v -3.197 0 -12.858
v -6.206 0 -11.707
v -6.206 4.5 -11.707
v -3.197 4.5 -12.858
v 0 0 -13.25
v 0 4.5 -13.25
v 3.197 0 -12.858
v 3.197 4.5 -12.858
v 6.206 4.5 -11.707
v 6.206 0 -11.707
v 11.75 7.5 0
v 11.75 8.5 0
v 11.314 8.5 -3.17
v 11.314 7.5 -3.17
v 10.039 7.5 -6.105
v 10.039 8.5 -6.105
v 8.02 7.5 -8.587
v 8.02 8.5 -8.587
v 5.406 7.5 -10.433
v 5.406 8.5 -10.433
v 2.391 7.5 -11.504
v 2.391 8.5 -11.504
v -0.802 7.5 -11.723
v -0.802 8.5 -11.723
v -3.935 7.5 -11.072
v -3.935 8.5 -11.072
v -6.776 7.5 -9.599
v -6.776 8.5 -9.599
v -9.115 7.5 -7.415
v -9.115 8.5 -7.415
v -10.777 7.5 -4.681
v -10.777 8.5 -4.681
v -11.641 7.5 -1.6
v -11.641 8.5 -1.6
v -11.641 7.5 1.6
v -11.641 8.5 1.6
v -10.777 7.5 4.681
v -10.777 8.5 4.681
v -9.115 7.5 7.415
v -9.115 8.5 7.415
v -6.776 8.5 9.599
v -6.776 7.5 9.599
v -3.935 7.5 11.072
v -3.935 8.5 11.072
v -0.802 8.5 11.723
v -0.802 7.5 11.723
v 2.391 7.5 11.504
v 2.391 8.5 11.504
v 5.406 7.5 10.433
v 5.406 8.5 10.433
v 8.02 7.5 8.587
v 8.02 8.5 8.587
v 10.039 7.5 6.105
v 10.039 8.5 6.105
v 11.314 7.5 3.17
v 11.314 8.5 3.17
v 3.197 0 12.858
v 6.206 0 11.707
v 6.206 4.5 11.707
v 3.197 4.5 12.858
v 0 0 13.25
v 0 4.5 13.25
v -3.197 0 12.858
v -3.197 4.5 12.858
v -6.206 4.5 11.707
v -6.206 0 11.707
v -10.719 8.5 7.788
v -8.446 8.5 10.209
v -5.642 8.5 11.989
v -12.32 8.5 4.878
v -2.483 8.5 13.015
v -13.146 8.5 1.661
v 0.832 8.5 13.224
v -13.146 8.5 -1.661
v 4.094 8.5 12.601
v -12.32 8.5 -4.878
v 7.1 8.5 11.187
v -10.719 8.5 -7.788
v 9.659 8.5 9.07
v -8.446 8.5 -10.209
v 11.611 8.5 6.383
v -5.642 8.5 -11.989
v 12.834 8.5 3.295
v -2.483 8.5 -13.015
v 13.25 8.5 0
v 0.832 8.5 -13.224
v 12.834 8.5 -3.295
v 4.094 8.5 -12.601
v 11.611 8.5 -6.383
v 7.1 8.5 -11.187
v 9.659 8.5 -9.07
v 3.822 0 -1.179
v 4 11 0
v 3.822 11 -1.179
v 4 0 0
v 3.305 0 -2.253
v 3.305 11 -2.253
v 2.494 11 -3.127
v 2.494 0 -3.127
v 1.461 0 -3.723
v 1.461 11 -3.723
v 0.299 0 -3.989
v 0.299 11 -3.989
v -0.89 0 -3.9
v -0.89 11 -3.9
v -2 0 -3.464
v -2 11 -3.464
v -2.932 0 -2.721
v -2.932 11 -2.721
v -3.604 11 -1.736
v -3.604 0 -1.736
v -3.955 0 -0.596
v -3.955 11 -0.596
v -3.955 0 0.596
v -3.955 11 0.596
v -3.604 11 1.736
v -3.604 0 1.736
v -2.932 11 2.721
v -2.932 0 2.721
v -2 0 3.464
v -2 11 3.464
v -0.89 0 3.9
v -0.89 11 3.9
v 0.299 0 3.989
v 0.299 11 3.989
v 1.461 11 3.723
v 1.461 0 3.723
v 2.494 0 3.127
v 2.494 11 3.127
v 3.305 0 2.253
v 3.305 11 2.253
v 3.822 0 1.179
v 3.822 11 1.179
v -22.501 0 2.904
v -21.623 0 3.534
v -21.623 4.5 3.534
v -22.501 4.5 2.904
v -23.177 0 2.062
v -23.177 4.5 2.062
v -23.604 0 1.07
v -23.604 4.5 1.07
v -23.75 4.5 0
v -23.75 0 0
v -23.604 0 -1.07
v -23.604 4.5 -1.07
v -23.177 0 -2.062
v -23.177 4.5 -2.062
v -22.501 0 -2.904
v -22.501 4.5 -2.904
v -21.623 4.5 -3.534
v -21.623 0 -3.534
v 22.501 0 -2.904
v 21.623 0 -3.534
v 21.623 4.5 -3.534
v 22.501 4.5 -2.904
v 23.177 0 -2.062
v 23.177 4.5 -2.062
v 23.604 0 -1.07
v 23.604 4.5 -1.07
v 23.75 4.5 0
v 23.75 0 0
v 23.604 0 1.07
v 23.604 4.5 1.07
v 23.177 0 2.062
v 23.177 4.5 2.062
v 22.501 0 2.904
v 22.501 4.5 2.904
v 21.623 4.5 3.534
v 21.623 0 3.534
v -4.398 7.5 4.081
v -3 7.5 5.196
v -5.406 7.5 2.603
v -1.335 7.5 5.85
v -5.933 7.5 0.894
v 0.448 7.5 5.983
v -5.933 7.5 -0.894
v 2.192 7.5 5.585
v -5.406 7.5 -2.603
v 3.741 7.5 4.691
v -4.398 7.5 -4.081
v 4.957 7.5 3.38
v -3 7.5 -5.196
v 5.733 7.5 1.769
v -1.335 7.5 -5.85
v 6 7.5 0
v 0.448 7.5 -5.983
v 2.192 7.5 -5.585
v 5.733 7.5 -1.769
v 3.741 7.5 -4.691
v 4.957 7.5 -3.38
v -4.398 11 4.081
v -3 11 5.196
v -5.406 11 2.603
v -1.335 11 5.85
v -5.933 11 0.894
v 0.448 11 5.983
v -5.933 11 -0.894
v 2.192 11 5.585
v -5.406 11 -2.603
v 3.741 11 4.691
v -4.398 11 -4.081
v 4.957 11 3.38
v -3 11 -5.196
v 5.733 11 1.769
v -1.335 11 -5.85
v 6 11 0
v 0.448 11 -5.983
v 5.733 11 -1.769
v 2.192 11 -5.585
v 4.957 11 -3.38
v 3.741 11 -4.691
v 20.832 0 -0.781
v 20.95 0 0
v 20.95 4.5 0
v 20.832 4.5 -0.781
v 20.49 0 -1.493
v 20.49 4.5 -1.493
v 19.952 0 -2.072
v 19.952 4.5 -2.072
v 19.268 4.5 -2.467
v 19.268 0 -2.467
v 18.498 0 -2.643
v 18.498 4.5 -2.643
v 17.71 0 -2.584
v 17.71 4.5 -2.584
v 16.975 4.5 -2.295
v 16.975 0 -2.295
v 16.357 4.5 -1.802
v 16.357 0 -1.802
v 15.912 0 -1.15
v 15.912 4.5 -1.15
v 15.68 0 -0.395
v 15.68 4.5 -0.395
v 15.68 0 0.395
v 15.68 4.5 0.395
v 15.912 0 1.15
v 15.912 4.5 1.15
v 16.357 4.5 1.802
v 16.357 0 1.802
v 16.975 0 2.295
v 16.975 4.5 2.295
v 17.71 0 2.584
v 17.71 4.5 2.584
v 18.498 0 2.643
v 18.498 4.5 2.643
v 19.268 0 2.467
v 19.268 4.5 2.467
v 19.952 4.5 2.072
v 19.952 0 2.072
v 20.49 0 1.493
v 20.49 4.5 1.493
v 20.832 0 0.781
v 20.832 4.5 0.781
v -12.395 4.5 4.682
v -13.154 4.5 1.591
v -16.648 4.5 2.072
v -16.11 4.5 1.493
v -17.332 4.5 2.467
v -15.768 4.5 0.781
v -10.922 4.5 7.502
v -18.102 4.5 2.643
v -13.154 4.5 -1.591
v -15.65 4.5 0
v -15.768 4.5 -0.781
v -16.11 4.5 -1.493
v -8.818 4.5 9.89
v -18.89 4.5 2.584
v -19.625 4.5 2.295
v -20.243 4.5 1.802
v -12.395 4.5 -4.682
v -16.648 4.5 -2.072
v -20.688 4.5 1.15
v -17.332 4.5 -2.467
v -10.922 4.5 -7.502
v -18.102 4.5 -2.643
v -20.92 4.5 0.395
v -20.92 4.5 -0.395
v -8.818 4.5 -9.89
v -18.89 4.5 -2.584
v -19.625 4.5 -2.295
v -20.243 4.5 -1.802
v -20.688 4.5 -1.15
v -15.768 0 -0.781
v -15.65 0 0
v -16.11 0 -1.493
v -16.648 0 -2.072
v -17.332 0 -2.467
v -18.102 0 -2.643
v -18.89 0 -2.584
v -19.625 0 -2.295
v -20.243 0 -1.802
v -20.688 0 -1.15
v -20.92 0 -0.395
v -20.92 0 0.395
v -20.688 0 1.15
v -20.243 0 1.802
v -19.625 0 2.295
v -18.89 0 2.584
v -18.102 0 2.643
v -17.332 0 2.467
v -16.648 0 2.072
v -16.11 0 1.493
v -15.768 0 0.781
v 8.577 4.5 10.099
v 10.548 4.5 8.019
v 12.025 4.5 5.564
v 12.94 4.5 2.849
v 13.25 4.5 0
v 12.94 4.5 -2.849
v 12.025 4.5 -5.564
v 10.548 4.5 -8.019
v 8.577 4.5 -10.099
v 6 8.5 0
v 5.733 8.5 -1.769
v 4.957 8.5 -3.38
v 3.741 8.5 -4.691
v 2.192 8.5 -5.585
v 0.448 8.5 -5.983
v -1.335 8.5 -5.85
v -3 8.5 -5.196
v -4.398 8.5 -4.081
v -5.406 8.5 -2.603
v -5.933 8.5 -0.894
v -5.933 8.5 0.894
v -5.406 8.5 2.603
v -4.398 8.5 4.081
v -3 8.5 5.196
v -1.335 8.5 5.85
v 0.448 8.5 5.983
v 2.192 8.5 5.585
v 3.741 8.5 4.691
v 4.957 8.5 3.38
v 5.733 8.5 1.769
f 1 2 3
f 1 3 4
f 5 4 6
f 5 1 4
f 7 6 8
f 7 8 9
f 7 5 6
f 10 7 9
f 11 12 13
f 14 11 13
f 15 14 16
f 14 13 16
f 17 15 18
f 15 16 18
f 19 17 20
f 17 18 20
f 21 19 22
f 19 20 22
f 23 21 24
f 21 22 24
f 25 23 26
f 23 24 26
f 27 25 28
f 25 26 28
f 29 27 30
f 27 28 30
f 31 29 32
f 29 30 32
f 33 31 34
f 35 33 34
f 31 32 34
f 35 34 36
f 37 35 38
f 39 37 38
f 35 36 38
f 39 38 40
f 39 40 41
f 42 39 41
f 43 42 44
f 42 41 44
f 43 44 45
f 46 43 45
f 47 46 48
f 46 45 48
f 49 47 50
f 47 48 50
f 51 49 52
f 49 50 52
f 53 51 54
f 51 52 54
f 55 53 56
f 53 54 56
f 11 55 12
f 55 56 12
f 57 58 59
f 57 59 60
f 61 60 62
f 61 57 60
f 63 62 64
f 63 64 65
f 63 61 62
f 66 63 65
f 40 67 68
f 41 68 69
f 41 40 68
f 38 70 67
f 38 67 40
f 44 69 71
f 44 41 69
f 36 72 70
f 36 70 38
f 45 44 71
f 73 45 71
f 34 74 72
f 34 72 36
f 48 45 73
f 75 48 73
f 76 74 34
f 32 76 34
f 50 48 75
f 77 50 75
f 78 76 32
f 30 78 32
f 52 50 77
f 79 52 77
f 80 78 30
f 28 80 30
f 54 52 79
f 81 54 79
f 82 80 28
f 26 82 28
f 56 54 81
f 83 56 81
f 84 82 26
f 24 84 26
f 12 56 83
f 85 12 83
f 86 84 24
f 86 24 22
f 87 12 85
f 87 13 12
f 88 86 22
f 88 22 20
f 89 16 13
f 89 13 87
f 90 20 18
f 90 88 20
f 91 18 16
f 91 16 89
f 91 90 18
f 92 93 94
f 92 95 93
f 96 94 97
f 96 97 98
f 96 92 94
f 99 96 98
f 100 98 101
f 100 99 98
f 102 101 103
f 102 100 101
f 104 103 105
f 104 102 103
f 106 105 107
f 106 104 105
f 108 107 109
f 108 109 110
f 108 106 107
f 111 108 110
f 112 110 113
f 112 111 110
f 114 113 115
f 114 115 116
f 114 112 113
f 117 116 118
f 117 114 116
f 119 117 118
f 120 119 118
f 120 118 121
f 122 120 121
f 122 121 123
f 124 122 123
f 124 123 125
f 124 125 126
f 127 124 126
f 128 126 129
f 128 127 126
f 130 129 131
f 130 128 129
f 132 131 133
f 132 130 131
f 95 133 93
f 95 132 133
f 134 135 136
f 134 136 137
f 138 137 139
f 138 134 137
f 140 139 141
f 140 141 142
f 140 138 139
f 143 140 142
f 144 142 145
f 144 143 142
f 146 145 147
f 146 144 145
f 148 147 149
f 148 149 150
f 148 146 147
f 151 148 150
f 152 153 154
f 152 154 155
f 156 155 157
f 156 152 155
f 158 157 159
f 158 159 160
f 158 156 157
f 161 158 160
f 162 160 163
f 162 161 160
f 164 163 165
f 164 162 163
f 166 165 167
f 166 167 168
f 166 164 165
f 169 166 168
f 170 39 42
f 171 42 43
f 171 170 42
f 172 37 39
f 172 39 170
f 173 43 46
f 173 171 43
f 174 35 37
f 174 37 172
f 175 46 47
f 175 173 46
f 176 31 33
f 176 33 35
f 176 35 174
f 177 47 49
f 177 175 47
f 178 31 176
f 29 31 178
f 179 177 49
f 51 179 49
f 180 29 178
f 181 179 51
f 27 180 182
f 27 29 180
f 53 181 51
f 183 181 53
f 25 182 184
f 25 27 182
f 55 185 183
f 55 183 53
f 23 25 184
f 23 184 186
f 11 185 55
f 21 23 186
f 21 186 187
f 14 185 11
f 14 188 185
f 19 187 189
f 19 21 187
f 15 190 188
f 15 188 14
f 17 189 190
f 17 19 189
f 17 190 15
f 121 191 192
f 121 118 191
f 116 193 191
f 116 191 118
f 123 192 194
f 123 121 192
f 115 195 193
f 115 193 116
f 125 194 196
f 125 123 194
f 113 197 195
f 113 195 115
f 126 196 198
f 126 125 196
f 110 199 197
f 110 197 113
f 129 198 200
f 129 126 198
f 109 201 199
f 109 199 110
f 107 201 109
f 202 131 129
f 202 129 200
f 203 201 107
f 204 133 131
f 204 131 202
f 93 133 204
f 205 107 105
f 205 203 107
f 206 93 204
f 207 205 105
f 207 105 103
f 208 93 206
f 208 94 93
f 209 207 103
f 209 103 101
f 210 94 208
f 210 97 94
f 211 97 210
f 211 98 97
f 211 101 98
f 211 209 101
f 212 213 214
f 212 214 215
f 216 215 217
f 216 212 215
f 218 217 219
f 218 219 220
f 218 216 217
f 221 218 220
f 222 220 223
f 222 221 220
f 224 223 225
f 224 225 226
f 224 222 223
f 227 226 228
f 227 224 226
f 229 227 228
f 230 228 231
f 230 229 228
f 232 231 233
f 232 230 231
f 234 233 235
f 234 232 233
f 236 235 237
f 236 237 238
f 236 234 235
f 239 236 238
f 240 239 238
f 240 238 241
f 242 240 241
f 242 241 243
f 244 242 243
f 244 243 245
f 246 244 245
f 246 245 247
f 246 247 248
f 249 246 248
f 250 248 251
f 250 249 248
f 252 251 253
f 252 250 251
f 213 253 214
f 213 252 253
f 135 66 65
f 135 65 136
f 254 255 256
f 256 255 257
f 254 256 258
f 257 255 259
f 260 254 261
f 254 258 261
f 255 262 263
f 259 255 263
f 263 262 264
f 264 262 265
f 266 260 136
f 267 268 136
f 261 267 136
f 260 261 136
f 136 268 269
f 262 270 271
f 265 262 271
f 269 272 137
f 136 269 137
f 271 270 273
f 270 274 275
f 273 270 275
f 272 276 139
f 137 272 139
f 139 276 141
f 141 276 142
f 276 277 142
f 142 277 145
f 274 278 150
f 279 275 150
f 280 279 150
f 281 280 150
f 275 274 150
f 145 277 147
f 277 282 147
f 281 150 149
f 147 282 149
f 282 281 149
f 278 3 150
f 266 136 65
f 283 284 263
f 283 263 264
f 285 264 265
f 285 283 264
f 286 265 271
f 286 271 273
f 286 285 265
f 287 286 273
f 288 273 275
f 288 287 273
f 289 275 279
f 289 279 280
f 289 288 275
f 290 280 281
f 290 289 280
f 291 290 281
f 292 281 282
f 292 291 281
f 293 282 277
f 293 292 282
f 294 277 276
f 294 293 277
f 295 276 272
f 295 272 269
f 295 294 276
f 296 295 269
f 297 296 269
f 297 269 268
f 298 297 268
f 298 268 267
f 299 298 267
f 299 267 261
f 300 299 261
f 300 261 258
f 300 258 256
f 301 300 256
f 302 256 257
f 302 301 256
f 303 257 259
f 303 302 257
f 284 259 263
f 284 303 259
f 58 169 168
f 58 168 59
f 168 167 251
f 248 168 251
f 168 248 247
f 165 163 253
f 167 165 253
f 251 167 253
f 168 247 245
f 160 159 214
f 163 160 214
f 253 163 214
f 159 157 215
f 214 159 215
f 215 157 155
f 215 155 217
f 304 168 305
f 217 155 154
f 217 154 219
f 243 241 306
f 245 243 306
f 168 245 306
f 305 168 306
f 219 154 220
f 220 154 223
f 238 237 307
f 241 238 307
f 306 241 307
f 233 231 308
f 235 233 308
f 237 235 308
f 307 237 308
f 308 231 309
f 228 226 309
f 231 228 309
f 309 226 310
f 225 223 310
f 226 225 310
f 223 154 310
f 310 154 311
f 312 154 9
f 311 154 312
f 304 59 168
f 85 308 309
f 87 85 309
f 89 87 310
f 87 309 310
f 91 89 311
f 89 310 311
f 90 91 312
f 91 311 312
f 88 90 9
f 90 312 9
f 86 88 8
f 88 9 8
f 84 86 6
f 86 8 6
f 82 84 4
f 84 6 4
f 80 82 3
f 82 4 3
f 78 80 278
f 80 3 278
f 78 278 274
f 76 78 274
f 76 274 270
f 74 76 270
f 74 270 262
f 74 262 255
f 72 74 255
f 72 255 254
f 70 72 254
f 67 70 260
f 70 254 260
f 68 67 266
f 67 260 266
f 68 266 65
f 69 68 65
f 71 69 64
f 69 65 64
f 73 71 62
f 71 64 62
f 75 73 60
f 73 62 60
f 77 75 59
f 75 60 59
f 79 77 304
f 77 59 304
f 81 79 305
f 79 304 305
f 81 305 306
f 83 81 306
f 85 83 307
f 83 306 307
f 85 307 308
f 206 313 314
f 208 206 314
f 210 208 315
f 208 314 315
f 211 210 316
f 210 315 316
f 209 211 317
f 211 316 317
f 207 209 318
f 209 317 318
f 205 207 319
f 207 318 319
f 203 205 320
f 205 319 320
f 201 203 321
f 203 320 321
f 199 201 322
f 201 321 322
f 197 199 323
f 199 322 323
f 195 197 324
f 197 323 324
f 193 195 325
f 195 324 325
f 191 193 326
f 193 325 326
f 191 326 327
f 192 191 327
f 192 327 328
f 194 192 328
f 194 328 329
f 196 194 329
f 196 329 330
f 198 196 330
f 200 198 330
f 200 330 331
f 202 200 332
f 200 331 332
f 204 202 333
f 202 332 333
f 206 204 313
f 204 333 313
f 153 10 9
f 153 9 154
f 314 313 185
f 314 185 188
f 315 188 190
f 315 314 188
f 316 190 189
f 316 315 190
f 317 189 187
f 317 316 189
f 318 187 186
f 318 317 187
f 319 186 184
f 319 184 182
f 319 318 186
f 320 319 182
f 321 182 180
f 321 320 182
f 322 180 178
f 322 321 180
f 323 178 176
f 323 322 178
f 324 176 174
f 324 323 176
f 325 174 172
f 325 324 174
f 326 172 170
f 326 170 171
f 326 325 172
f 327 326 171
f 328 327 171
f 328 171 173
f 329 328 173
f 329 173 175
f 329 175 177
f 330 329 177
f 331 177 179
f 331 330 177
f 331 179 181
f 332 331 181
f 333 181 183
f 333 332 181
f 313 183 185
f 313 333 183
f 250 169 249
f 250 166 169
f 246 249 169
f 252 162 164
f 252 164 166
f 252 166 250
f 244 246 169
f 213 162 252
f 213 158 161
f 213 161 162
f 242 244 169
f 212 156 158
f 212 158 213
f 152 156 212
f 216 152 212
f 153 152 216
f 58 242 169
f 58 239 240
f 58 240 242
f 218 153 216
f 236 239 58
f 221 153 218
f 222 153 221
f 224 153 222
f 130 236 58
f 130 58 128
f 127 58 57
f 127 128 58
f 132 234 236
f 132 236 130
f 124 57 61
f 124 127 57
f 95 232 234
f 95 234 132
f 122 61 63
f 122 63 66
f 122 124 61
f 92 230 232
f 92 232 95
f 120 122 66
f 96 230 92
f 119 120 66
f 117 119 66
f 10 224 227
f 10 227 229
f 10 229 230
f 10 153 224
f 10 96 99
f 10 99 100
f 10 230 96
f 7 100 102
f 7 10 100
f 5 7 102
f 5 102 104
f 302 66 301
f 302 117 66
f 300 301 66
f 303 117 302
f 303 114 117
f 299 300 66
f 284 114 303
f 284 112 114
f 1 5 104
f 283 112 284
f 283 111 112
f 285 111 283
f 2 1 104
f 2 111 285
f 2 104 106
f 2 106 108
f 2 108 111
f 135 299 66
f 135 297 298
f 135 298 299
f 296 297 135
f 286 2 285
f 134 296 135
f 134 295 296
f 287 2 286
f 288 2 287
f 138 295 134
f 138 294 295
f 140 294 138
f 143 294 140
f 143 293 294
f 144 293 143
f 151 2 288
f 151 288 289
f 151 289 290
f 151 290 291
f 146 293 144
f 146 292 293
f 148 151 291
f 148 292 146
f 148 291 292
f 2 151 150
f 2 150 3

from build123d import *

# Parameters (mm, degrees)
SKETCH1_R           = 2.65
SKETCH1_R_2         = 4
BOSS_EXTRUDE1_DEPTH = 4.5
SKETCH2_R           = 13.25
SKETCH2_R_2         = 4
BOSS_EXTRUDE2_DEPTH = 4
SKETCH3_R           = 6
SKETCH3_R_2         = 4
BOSS_EXTRUDE3_DEPTH = 2.5
SKETCH4_R           = 11.75
SKETCH4_R_2         = 6
CUT_EXTRUDE1_DEPTH  = 1


with BuildPart() as part:
    # Sketch1 → Boss-Extrude1 (new body)
    with BuildSketch(Plane(origin=(0, 0, 0), x_dir=(1, 0, 0), z_dir=(0, 1, 0))):
        with BuildLine():
            Line((6.205696203, 11.706913967), (21.623417722, 3.534162707))
            ThreePointArc((21.623417722, 3.534162707), (23.75, 0), (21.623417722, -3.534162707))
            Line((21.623417722, -3.534162707), (6.205696203, -11.706913967))
            ThreePointArc((6.205696203, -11.706913967), (0, -13.25), (-6.205696203, -11.706913967))
            Line((-6.205696203, -11.706913967), (-21.623417722, -3.534162707))
            ThreePointArc((-21.623417722, -3.534162707), (-23.75, 0), (-21.623417722, 3.534162707))
            Line((-21.623417722, 3.534162707), (-6.205696203, 11.706913967))
            ThreePointArc((-6.205696203, 11.706913967), (0, 13.25), (6.205696203, 11.706913967))
        make_face()
        with Locations((-18.3, 0)):
            Circle(SKETCH1_R, mode=Mode.SUBTRACT)
        with Locations((18.3, 0)):
            Circle(SKETCH1_R, mode=Mode.SUBTRACT)
        Circle(SKETCH1_R_2, mode=Mode.SUBTRACT)
    extrude(amount=BOSS_EXTRUDE1_DEPTH)

    # Sketch2 → Boss-Extrude2 (add)
    with BuildSketch(Plane(origin=(0, 4.5, 0), x_dir=(1, 0, 0), z_dir=(0, 1, 0))):
        Circle(SKETCH2_R)
        Circle(SKETCH2_R_2, mode=Mode.SUBTRACT)
    extrude(amount=BOSS_EXTRUDE2_DEPTH)

    # Sketch3 → Boss-Extrude3 (add)
    with BuildSketch(Plane(origin=(0, 8.5, 0), x_dir=(1, 0, 0), z_dir=(0, 1, 0))):
        Circle(SKETCH3_R)
        Circle(SKETCH3_R_2, mode=Mode.SUBTRACT)
    extrude(amount=BOSS_EXTRUDE3_DEPTH)

    # Sketch4 → Cut-Extrude1 (cut)
    with BuildSketch(Plane(origin=(0, 8.5, 0), x_dir=(1, 0, 0), z_dir=(0, 1, 0))):
        Circle(SKETCH4_R)
        Circle(SKETCH4_R_2, mode=Mode.SUBTRACT)
    extrude(amount=-CUT_EXTRUDE1_DEPTH, mode=Mode.SUBTRACT)


solid = part.part
